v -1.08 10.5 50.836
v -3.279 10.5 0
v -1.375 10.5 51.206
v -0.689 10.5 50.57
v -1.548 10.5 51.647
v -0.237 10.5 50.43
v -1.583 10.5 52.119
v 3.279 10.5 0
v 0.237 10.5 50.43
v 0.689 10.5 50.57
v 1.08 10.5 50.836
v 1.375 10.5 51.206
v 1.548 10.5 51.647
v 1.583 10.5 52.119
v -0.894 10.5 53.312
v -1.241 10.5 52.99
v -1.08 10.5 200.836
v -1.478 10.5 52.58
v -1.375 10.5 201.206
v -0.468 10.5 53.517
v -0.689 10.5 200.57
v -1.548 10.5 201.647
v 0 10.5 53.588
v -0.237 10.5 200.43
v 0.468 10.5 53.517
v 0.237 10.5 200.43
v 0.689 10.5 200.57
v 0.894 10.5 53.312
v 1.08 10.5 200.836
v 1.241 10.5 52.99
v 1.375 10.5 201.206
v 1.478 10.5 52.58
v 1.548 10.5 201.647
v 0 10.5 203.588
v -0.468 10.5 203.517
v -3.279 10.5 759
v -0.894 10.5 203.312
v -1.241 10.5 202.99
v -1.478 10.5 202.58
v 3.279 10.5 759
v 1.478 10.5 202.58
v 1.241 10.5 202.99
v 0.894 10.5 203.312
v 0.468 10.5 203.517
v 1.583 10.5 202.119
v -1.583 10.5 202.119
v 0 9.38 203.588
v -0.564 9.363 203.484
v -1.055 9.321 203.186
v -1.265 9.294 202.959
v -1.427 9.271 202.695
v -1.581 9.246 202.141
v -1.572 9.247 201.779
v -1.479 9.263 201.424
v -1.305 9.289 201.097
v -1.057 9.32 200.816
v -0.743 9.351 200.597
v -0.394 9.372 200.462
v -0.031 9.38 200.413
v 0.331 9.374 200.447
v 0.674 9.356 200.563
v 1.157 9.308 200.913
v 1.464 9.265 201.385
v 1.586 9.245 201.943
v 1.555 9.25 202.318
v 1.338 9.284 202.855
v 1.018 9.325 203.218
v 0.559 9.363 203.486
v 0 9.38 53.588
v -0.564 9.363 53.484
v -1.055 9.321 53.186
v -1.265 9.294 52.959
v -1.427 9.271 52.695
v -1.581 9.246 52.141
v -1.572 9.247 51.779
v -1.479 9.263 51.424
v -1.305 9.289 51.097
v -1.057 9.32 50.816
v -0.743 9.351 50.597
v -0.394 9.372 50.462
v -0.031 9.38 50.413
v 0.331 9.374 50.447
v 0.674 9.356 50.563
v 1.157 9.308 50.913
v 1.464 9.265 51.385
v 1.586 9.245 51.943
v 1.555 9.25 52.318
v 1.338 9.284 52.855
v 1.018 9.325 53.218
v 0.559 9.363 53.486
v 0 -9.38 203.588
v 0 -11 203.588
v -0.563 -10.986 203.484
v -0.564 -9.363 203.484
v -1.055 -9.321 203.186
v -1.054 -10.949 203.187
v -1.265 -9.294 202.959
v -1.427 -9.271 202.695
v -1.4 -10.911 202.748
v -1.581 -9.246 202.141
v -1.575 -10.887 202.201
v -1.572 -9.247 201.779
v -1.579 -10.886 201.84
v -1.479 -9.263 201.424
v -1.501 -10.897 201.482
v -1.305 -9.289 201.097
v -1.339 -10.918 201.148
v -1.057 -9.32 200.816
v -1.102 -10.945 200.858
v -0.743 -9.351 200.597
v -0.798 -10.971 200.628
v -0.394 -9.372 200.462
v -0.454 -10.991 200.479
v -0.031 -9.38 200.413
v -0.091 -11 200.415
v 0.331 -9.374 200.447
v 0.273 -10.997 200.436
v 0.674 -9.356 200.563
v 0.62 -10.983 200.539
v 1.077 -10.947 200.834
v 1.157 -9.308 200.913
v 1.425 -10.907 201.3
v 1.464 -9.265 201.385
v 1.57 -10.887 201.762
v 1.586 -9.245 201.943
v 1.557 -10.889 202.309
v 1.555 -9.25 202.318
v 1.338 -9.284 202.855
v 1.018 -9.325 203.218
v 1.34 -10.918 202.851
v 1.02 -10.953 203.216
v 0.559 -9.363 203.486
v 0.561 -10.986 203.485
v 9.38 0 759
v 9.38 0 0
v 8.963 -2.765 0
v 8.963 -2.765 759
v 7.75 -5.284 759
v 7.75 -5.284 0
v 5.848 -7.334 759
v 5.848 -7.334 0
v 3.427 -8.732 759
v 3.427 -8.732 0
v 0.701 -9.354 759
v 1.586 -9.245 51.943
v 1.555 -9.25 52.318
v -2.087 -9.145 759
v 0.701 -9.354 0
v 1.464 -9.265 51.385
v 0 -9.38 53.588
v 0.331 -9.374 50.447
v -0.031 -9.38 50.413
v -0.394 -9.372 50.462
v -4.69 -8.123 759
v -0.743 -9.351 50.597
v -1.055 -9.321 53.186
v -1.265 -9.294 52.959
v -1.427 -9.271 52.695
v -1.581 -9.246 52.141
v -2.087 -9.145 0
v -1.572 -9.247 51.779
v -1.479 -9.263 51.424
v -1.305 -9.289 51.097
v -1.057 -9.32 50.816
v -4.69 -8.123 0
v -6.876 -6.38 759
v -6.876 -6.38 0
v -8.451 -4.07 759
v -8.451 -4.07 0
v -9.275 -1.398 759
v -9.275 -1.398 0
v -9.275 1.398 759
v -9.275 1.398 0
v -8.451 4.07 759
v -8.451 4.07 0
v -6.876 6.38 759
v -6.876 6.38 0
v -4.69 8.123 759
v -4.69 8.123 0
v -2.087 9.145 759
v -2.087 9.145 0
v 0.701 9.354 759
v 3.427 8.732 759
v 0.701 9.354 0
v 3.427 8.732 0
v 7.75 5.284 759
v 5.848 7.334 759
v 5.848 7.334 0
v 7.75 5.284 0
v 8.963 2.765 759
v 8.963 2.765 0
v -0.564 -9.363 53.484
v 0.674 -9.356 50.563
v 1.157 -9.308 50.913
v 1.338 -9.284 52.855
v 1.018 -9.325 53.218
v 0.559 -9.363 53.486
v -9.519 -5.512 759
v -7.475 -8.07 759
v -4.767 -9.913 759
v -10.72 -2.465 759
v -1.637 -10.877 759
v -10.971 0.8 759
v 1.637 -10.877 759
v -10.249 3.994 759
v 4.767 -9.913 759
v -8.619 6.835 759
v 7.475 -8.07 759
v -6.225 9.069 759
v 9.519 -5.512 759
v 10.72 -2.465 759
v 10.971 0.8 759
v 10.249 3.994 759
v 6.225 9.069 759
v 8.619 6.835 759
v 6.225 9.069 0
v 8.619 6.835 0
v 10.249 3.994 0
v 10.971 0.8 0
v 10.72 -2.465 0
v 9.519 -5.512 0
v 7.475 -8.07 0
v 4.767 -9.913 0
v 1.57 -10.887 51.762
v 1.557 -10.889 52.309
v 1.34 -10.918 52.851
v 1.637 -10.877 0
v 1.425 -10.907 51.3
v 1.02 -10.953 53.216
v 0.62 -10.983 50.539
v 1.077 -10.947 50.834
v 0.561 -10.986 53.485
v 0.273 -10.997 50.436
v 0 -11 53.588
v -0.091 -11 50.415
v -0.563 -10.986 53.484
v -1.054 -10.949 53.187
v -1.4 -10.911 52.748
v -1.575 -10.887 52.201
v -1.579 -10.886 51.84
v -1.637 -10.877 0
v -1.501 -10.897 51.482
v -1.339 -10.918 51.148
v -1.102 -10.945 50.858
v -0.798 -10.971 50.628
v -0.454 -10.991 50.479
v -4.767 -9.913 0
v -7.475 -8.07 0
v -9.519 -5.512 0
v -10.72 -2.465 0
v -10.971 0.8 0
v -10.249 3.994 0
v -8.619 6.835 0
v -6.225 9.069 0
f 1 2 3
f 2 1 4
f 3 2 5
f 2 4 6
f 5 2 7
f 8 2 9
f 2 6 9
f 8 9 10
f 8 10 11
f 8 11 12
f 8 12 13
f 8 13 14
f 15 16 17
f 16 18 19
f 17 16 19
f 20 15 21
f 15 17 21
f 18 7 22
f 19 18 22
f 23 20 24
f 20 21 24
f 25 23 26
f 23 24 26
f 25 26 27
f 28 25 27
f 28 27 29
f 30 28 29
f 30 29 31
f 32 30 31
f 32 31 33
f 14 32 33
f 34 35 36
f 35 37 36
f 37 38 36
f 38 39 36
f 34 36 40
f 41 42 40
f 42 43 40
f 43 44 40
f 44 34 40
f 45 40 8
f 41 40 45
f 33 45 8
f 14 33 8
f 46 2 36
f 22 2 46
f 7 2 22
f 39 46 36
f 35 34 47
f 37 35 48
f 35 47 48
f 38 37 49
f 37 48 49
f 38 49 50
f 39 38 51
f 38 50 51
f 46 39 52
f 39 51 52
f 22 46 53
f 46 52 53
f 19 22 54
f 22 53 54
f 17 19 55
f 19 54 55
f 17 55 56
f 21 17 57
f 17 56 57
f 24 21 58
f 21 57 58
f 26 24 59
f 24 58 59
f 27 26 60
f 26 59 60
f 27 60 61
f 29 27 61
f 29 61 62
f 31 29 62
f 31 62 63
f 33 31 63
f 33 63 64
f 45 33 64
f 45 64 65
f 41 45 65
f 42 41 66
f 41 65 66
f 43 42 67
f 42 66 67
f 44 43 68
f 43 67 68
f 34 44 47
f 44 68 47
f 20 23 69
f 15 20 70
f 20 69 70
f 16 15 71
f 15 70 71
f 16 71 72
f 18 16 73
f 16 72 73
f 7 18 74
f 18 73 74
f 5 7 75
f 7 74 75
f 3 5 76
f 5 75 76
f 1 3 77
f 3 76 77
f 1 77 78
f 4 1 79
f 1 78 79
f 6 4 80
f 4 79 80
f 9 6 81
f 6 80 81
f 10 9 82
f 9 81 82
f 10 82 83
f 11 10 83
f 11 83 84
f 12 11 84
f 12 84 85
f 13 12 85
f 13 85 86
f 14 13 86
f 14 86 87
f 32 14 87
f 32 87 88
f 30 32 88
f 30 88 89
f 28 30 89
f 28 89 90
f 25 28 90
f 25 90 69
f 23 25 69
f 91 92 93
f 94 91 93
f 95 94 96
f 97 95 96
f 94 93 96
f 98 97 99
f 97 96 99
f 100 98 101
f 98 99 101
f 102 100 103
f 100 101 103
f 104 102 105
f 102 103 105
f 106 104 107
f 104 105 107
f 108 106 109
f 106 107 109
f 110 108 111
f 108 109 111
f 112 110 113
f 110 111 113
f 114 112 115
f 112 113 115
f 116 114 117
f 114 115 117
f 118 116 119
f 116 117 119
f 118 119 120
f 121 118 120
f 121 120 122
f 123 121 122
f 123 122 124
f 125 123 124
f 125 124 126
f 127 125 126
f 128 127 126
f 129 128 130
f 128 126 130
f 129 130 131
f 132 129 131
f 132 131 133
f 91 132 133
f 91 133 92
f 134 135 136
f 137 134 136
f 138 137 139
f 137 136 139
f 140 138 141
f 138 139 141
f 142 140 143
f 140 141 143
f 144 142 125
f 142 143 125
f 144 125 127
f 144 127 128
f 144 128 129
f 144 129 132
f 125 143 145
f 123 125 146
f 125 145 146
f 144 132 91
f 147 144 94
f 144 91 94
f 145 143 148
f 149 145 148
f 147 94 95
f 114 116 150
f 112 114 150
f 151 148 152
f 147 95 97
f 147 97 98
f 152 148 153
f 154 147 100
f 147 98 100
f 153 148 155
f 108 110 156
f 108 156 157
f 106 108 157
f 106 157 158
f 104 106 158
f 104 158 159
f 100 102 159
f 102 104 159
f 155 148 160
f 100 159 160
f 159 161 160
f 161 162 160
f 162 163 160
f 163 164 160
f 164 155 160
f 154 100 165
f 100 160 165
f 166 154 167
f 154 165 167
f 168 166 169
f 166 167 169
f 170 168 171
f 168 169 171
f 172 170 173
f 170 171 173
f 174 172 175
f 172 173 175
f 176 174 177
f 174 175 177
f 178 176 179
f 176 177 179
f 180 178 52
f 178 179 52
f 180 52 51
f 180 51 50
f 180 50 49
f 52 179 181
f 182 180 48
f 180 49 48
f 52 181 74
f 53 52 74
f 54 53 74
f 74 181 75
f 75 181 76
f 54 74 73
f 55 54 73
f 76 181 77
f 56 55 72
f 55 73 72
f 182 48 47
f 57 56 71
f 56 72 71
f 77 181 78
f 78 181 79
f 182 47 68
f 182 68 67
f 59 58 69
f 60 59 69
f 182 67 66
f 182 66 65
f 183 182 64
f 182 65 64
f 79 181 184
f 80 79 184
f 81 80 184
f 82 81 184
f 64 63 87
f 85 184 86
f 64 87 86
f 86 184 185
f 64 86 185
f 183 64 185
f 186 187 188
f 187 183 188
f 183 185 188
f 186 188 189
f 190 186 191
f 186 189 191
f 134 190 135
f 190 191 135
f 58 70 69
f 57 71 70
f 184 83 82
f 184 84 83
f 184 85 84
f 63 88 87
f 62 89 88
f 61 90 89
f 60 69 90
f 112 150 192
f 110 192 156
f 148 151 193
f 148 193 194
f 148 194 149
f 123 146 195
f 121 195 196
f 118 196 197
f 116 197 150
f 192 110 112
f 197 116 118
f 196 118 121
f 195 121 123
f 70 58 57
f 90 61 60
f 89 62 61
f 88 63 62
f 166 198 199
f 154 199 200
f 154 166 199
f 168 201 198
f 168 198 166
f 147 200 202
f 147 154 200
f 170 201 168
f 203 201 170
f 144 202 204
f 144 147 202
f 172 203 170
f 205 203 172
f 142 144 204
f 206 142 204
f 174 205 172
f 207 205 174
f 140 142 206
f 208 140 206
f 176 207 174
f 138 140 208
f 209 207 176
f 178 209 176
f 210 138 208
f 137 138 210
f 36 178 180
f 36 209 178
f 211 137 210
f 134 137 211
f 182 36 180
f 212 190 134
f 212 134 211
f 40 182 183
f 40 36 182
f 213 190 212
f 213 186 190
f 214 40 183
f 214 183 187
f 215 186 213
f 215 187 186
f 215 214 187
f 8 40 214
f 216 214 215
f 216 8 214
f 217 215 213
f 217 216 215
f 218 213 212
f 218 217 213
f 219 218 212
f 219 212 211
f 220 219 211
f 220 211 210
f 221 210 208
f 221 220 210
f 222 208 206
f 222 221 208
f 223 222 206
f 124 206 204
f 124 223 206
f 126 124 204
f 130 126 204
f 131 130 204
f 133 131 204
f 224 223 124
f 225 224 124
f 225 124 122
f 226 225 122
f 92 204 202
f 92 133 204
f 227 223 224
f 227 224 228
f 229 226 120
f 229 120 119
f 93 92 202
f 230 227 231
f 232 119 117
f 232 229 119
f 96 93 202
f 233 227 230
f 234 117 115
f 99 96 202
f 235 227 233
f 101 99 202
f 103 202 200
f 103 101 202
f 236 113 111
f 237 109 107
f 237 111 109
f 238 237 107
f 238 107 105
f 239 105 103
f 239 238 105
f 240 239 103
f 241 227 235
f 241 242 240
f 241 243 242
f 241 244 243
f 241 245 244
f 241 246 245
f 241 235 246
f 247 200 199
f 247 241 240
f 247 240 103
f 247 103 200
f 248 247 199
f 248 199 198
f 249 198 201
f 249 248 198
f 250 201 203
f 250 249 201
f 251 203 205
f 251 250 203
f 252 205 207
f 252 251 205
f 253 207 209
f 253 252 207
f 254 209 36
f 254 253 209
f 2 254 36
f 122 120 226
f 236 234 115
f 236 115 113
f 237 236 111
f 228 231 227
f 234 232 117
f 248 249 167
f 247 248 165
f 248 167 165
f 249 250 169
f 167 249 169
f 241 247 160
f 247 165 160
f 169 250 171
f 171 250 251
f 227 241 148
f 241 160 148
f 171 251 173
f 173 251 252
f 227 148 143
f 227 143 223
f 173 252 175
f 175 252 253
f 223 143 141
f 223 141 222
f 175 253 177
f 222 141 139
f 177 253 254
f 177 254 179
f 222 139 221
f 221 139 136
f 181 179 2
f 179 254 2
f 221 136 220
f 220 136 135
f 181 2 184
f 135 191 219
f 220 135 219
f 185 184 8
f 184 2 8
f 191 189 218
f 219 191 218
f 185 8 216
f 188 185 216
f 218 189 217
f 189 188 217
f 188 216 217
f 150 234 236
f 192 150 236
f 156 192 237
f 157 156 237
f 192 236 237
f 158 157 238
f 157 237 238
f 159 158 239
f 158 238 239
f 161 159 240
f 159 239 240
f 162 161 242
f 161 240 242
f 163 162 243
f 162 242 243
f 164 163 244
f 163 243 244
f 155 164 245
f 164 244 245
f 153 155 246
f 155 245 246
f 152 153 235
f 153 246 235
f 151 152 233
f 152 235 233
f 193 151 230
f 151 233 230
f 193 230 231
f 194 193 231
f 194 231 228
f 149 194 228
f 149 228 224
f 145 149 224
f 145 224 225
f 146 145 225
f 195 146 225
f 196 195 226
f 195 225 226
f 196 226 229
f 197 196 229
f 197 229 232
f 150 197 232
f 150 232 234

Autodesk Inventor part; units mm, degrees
ref_plane "YZ Plane" through (0, 0, 0) normal (1, 0, 0) x (0, 1, 0)
ref_plane "XZ Plane" through (0, 0, 0) normal (0, 1, 0) x (-1, 0, 0)
ref_plane "XY Plane" through (0, 0, 0) normal (0, 0, 1) x (1, 0, 0)
sketch "Sketch1" plane through (0, 0, 0) normal (0, 0, 1) x (1, 0, 0)
  circle A0 centre (0, 0) radius 11
  circle A1 centre (0, 0) radius 9.38
  dimension "d0" = 22
  dimension "d2" = 1.62
extrude "Extrusion1" add sketch "Sketch1" along normal blind 759
sketch "Sketch6" plane through (0, 0, 759) normal (0, 0, 1) x (1, 0, 0)
  circle A0 centre (0, 0) radius 9.38 projected
  circle A1 centre (0, 0) radius 11 projected
  line L0 (-3.2787, 10.5) -> (3.2787, 10.5)
  dimension "d18" = 10.5
extrude "Extrusion3" cut sketch "Sketch6" against normal through all contours L0 A1 picked at (-0.3693, 10.648)
sketch "Sketch7" plane through (-3.2787, 10.5, 759) normal (0, 1, 0) x (1, 0, 0)
  circle A0 centre (3.2787, 857) radius 1.27
  line L0 (0, 0) -> (0, 759) projected
  circle A1 centre (3.2787, 707) radius 1.27
  circle A2 centre (3.2787, 557) radius 1.27
  point P0 (3.2787, 759)
  dimension "d34" = 150
  dimension "d47" = 52
  dimension "d48" = 150
hole "Hole3" at (0, 10.5, -98) at (0, 10.5, 52) at (0, 10.5, 202) direction (0, -1, 0) diameter 3.175 end through all
properties part number "2f2barm" material "PVC-Piping"
